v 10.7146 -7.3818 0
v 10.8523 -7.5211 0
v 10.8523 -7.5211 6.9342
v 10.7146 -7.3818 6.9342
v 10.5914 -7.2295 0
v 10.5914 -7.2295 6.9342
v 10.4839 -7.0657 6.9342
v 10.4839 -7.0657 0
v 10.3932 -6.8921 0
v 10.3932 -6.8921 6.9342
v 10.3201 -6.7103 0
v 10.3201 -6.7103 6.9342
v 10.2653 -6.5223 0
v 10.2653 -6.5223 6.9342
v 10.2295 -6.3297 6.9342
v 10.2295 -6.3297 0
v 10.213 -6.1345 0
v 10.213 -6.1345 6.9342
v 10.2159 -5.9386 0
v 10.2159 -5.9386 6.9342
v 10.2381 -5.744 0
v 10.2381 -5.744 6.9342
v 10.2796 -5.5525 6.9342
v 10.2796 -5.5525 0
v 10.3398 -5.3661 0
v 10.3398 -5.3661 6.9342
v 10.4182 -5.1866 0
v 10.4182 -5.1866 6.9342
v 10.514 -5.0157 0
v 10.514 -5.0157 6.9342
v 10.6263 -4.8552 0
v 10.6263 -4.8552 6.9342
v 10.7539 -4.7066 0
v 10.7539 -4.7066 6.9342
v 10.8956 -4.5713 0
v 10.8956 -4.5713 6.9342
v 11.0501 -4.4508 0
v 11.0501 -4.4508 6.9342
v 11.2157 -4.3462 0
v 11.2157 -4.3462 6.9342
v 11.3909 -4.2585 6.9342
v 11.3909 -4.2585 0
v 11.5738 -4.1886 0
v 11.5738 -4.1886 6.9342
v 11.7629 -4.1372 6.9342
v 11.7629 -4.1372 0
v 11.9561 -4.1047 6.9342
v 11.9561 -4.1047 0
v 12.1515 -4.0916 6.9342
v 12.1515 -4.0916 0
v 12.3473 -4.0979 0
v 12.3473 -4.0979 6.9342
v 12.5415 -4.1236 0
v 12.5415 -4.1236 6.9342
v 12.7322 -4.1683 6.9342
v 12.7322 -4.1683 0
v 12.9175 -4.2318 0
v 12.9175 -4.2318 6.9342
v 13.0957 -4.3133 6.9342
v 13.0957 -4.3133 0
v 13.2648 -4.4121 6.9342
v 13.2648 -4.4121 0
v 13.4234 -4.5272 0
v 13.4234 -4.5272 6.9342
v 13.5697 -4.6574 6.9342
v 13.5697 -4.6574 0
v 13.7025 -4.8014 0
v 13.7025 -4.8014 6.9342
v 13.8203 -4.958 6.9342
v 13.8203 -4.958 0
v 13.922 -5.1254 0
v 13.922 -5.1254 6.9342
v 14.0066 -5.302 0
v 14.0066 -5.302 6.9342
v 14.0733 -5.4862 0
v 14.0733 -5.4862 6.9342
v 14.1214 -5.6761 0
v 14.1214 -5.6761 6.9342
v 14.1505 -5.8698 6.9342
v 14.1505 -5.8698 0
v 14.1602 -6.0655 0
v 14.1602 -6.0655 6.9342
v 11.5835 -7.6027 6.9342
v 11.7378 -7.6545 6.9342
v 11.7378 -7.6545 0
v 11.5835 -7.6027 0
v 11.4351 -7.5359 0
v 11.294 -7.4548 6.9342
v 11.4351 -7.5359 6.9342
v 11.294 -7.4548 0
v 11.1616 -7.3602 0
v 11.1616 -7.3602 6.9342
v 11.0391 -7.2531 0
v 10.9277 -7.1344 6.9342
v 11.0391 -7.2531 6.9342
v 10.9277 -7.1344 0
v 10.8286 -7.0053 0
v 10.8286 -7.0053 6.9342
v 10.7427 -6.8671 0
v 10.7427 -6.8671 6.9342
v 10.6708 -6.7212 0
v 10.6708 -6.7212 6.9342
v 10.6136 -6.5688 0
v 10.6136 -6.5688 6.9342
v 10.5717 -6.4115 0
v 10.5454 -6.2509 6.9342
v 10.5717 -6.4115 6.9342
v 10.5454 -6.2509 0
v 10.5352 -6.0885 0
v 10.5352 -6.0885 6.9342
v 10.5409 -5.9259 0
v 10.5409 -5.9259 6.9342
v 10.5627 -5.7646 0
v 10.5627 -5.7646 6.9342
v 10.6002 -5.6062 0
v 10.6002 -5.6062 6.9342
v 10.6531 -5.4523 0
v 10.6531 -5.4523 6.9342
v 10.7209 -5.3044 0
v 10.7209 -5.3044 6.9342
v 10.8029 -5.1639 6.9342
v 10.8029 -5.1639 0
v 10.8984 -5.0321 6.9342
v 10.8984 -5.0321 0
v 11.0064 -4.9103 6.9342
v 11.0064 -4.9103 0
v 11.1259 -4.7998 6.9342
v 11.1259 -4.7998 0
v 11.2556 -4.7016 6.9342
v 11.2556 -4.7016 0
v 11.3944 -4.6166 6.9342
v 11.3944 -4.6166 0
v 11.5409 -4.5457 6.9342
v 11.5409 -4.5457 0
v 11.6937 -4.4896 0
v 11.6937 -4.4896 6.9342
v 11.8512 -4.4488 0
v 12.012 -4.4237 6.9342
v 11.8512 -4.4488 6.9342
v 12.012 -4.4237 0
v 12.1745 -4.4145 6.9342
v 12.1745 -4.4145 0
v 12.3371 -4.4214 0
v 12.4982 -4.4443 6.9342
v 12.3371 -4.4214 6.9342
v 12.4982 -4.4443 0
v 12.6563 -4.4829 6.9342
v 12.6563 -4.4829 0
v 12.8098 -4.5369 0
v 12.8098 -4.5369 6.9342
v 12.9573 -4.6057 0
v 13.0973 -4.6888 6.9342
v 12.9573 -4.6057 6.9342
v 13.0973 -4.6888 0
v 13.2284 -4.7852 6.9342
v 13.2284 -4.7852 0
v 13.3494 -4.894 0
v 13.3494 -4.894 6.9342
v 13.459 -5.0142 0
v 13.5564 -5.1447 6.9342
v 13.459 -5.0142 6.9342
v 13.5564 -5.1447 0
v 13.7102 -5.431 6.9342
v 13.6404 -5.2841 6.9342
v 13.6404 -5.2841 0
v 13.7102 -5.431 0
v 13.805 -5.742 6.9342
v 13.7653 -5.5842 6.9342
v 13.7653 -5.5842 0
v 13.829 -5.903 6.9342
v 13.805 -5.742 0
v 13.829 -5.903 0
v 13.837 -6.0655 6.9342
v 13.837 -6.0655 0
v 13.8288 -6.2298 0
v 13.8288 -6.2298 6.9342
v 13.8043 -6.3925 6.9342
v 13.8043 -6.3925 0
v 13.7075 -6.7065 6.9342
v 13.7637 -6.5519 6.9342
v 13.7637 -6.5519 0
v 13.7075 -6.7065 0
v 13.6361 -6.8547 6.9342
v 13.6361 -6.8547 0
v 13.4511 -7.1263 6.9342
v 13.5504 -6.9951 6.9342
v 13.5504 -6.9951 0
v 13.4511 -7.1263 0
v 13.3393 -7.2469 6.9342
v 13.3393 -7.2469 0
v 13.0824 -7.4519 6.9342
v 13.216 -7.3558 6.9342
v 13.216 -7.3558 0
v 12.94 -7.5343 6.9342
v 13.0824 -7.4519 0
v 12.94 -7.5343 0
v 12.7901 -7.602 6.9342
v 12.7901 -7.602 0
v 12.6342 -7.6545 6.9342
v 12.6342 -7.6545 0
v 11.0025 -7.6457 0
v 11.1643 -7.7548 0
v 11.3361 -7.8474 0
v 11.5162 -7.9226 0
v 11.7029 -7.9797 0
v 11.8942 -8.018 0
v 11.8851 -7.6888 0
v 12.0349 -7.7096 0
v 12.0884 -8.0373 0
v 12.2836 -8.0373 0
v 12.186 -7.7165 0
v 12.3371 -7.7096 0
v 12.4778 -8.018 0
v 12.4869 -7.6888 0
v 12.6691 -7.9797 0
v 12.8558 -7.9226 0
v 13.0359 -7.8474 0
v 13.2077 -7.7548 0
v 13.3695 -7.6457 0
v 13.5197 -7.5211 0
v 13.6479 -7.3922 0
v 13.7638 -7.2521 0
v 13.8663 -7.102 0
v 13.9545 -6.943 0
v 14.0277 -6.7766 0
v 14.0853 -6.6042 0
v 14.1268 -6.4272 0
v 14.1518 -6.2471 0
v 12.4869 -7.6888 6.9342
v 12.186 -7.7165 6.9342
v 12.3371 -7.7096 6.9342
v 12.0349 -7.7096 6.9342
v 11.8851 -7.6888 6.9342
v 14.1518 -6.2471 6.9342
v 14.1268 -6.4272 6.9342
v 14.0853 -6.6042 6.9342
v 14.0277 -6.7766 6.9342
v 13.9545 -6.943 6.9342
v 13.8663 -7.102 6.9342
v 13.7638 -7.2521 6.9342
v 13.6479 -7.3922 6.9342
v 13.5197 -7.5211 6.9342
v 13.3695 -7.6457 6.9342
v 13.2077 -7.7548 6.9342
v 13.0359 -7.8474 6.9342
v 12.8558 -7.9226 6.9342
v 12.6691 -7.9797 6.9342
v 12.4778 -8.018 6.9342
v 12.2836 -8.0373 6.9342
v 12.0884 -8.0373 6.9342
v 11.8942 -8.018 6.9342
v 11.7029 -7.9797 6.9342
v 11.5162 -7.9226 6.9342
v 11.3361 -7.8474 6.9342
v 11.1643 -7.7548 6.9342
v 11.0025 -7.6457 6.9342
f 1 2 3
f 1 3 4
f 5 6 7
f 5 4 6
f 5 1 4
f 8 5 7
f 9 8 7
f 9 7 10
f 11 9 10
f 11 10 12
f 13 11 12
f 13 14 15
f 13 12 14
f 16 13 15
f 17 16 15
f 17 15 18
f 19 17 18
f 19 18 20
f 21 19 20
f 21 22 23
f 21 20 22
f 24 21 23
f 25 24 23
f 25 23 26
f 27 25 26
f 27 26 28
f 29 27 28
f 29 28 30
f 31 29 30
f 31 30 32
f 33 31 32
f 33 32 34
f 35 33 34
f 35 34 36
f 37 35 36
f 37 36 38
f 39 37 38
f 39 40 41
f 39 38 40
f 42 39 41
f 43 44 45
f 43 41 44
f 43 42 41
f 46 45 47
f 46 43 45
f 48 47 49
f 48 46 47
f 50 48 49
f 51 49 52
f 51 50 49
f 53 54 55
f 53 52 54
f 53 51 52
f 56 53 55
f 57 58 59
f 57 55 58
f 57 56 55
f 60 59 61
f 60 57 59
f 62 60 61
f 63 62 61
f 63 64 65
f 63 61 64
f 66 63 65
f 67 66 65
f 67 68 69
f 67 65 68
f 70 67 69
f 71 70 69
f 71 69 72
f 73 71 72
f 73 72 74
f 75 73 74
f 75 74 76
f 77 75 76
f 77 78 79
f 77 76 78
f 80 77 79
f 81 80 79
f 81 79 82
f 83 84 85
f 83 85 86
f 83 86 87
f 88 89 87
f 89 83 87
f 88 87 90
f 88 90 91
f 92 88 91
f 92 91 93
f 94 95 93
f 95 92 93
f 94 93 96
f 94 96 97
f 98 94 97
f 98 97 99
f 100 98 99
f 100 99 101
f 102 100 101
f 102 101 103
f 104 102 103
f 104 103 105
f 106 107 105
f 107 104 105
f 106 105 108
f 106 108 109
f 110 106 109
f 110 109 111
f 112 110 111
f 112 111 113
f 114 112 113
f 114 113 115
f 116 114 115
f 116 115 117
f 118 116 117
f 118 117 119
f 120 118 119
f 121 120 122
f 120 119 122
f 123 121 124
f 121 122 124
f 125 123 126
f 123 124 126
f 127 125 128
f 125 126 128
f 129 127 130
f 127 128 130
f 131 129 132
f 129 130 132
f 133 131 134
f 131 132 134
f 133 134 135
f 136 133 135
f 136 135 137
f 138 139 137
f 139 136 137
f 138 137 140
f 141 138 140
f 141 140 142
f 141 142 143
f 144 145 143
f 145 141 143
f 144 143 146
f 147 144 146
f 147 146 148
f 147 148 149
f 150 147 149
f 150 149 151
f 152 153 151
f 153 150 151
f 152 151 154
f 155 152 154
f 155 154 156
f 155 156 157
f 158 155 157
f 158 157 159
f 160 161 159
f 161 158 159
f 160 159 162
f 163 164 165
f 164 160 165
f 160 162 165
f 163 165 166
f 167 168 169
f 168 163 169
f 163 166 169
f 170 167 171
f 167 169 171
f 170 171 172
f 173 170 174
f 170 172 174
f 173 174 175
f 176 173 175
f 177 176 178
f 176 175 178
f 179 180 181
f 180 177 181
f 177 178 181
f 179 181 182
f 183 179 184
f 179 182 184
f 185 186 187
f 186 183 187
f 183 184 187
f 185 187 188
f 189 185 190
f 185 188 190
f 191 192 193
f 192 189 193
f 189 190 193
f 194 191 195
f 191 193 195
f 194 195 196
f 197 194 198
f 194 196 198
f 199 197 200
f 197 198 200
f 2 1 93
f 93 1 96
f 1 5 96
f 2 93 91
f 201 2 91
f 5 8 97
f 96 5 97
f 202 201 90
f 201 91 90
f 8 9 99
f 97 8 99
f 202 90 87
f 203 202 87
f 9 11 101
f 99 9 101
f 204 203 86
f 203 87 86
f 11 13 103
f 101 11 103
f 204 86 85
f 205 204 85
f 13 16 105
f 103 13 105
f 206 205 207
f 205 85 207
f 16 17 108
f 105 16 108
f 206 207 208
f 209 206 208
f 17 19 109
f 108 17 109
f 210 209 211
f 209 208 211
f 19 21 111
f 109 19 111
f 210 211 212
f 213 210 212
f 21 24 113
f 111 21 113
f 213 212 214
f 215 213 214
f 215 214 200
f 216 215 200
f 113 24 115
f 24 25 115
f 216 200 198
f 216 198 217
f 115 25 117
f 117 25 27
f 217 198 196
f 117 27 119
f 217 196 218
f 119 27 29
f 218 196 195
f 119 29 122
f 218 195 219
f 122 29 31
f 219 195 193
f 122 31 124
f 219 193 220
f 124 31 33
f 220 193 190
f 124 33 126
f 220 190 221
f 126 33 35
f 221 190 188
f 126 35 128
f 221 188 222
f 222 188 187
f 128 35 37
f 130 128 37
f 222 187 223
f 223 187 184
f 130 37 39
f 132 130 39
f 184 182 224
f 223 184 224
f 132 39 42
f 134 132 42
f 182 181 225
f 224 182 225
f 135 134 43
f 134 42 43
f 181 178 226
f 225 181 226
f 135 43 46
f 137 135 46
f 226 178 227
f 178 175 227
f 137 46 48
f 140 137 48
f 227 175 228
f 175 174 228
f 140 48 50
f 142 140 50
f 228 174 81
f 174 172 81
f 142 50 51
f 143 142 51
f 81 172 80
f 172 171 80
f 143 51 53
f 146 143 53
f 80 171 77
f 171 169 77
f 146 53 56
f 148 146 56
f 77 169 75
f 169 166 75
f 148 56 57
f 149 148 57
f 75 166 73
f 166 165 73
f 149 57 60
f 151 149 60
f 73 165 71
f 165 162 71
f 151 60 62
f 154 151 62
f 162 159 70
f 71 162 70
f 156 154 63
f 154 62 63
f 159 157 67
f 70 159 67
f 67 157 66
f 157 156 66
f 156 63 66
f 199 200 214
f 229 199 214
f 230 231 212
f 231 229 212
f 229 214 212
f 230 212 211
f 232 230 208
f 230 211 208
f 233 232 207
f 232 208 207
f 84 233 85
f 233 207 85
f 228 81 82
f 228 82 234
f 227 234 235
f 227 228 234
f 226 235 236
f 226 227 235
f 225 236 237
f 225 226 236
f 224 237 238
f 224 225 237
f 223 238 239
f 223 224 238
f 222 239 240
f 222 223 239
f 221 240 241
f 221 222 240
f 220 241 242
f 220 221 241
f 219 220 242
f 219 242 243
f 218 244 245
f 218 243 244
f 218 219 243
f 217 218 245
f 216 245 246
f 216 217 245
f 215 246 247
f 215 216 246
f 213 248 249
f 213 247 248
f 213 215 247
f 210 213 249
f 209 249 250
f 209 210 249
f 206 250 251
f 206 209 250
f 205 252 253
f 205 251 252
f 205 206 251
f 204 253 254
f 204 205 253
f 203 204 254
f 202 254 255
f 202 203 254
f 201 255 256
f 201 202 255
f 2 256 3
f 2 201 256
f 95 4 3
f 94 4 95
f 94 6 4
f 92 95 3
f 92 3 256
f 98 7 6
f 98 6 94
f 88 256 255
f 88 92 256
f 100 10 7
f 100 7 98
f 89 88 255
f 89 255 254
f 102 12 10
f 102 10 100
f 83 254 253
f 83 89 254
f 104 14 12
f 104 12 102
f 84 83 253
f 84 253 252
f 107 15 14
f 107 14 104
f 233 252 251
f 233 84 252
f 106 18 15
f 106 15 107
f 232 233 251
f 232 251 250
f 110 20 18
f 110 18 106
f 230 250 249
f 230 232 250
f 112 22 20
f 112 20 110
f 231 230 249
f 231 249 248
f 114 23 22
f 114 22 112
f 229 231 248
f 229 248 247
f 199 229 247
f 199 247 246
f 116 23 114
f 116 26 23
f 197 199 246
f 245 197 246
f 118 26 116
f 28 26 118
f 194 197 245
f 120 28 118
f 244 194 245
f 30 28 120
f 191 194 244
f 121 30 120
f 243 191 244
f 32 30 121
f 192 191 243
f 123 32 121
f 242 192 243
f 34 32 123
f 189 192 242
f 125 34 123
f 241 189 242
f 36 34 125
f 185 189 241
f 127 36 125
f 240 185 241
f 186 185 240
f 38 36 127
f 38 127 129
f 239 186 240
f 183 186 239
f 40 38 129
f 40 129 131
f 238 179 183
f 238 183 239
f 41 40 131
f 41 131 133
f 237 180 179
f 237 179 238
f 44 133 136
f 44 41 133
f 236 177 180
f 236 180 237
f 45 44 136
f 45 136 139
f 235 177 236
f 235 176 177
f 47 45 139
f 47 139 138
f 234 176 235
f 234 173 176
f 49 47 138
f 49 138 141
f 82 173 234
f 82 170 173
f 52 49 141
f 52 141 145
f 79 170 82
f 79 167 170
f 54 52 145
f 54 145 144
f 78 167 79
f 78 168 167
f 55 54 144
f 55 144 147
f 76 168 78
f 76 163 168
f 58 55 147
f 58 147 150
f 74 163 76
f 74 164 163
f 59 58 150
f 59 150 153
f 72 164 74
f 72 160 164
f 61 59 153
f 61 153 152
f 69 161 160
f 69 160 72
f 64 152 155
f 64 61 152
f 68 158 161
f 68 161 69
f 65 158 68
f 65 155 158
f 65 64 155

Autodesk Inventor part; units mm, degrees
ref_plane "YZ Plane" through (0, 0, 0) normal (1, 0, 0) x (0, 1, 0)
ref_plane "XZ Plane" through (0, 0, 0) normal (0, 1, 0) x (-1, 0, 0)
ref_plane "XY Plane" through (0, 0, 0) normal (0, 0, 1) x (1, 0, 0)
sketch "Sketch1" plane through (0, 0, 0) normal (0, 0, 1) x (1, 0, 0)
  arc A0 (13.554, -7.5586) -> (10.818, -7.5586) centre (12.186, -6.0655) ccw projected
  arc A1 (12.5997, -7.5323) -> (11.7723, -7.5323) centre (12.186, -6.0655) ccw projected
  arc A2 (13.5197, -7.5211) -> (10.8523, -7.5211) centre (12.186, -6.0655) ccw
  arc A3 (12.6342, -7.6545) -> (11.7378, -7.6545) centre (12.186, -6.0655) ccw
  circle A4 centre (12.186, -6.0655) radius 1.651
  circle A5 centre (12.186, -6.0655) radius 1.9742
  point P0 (0, 0)
  dimension "d0" = 0.0508
  dimension "d1" = 0.127
extrude "Extrusion1" add sketch "Sketch1" along normal blind 6.9342
properties part number "ServoSpacer"
